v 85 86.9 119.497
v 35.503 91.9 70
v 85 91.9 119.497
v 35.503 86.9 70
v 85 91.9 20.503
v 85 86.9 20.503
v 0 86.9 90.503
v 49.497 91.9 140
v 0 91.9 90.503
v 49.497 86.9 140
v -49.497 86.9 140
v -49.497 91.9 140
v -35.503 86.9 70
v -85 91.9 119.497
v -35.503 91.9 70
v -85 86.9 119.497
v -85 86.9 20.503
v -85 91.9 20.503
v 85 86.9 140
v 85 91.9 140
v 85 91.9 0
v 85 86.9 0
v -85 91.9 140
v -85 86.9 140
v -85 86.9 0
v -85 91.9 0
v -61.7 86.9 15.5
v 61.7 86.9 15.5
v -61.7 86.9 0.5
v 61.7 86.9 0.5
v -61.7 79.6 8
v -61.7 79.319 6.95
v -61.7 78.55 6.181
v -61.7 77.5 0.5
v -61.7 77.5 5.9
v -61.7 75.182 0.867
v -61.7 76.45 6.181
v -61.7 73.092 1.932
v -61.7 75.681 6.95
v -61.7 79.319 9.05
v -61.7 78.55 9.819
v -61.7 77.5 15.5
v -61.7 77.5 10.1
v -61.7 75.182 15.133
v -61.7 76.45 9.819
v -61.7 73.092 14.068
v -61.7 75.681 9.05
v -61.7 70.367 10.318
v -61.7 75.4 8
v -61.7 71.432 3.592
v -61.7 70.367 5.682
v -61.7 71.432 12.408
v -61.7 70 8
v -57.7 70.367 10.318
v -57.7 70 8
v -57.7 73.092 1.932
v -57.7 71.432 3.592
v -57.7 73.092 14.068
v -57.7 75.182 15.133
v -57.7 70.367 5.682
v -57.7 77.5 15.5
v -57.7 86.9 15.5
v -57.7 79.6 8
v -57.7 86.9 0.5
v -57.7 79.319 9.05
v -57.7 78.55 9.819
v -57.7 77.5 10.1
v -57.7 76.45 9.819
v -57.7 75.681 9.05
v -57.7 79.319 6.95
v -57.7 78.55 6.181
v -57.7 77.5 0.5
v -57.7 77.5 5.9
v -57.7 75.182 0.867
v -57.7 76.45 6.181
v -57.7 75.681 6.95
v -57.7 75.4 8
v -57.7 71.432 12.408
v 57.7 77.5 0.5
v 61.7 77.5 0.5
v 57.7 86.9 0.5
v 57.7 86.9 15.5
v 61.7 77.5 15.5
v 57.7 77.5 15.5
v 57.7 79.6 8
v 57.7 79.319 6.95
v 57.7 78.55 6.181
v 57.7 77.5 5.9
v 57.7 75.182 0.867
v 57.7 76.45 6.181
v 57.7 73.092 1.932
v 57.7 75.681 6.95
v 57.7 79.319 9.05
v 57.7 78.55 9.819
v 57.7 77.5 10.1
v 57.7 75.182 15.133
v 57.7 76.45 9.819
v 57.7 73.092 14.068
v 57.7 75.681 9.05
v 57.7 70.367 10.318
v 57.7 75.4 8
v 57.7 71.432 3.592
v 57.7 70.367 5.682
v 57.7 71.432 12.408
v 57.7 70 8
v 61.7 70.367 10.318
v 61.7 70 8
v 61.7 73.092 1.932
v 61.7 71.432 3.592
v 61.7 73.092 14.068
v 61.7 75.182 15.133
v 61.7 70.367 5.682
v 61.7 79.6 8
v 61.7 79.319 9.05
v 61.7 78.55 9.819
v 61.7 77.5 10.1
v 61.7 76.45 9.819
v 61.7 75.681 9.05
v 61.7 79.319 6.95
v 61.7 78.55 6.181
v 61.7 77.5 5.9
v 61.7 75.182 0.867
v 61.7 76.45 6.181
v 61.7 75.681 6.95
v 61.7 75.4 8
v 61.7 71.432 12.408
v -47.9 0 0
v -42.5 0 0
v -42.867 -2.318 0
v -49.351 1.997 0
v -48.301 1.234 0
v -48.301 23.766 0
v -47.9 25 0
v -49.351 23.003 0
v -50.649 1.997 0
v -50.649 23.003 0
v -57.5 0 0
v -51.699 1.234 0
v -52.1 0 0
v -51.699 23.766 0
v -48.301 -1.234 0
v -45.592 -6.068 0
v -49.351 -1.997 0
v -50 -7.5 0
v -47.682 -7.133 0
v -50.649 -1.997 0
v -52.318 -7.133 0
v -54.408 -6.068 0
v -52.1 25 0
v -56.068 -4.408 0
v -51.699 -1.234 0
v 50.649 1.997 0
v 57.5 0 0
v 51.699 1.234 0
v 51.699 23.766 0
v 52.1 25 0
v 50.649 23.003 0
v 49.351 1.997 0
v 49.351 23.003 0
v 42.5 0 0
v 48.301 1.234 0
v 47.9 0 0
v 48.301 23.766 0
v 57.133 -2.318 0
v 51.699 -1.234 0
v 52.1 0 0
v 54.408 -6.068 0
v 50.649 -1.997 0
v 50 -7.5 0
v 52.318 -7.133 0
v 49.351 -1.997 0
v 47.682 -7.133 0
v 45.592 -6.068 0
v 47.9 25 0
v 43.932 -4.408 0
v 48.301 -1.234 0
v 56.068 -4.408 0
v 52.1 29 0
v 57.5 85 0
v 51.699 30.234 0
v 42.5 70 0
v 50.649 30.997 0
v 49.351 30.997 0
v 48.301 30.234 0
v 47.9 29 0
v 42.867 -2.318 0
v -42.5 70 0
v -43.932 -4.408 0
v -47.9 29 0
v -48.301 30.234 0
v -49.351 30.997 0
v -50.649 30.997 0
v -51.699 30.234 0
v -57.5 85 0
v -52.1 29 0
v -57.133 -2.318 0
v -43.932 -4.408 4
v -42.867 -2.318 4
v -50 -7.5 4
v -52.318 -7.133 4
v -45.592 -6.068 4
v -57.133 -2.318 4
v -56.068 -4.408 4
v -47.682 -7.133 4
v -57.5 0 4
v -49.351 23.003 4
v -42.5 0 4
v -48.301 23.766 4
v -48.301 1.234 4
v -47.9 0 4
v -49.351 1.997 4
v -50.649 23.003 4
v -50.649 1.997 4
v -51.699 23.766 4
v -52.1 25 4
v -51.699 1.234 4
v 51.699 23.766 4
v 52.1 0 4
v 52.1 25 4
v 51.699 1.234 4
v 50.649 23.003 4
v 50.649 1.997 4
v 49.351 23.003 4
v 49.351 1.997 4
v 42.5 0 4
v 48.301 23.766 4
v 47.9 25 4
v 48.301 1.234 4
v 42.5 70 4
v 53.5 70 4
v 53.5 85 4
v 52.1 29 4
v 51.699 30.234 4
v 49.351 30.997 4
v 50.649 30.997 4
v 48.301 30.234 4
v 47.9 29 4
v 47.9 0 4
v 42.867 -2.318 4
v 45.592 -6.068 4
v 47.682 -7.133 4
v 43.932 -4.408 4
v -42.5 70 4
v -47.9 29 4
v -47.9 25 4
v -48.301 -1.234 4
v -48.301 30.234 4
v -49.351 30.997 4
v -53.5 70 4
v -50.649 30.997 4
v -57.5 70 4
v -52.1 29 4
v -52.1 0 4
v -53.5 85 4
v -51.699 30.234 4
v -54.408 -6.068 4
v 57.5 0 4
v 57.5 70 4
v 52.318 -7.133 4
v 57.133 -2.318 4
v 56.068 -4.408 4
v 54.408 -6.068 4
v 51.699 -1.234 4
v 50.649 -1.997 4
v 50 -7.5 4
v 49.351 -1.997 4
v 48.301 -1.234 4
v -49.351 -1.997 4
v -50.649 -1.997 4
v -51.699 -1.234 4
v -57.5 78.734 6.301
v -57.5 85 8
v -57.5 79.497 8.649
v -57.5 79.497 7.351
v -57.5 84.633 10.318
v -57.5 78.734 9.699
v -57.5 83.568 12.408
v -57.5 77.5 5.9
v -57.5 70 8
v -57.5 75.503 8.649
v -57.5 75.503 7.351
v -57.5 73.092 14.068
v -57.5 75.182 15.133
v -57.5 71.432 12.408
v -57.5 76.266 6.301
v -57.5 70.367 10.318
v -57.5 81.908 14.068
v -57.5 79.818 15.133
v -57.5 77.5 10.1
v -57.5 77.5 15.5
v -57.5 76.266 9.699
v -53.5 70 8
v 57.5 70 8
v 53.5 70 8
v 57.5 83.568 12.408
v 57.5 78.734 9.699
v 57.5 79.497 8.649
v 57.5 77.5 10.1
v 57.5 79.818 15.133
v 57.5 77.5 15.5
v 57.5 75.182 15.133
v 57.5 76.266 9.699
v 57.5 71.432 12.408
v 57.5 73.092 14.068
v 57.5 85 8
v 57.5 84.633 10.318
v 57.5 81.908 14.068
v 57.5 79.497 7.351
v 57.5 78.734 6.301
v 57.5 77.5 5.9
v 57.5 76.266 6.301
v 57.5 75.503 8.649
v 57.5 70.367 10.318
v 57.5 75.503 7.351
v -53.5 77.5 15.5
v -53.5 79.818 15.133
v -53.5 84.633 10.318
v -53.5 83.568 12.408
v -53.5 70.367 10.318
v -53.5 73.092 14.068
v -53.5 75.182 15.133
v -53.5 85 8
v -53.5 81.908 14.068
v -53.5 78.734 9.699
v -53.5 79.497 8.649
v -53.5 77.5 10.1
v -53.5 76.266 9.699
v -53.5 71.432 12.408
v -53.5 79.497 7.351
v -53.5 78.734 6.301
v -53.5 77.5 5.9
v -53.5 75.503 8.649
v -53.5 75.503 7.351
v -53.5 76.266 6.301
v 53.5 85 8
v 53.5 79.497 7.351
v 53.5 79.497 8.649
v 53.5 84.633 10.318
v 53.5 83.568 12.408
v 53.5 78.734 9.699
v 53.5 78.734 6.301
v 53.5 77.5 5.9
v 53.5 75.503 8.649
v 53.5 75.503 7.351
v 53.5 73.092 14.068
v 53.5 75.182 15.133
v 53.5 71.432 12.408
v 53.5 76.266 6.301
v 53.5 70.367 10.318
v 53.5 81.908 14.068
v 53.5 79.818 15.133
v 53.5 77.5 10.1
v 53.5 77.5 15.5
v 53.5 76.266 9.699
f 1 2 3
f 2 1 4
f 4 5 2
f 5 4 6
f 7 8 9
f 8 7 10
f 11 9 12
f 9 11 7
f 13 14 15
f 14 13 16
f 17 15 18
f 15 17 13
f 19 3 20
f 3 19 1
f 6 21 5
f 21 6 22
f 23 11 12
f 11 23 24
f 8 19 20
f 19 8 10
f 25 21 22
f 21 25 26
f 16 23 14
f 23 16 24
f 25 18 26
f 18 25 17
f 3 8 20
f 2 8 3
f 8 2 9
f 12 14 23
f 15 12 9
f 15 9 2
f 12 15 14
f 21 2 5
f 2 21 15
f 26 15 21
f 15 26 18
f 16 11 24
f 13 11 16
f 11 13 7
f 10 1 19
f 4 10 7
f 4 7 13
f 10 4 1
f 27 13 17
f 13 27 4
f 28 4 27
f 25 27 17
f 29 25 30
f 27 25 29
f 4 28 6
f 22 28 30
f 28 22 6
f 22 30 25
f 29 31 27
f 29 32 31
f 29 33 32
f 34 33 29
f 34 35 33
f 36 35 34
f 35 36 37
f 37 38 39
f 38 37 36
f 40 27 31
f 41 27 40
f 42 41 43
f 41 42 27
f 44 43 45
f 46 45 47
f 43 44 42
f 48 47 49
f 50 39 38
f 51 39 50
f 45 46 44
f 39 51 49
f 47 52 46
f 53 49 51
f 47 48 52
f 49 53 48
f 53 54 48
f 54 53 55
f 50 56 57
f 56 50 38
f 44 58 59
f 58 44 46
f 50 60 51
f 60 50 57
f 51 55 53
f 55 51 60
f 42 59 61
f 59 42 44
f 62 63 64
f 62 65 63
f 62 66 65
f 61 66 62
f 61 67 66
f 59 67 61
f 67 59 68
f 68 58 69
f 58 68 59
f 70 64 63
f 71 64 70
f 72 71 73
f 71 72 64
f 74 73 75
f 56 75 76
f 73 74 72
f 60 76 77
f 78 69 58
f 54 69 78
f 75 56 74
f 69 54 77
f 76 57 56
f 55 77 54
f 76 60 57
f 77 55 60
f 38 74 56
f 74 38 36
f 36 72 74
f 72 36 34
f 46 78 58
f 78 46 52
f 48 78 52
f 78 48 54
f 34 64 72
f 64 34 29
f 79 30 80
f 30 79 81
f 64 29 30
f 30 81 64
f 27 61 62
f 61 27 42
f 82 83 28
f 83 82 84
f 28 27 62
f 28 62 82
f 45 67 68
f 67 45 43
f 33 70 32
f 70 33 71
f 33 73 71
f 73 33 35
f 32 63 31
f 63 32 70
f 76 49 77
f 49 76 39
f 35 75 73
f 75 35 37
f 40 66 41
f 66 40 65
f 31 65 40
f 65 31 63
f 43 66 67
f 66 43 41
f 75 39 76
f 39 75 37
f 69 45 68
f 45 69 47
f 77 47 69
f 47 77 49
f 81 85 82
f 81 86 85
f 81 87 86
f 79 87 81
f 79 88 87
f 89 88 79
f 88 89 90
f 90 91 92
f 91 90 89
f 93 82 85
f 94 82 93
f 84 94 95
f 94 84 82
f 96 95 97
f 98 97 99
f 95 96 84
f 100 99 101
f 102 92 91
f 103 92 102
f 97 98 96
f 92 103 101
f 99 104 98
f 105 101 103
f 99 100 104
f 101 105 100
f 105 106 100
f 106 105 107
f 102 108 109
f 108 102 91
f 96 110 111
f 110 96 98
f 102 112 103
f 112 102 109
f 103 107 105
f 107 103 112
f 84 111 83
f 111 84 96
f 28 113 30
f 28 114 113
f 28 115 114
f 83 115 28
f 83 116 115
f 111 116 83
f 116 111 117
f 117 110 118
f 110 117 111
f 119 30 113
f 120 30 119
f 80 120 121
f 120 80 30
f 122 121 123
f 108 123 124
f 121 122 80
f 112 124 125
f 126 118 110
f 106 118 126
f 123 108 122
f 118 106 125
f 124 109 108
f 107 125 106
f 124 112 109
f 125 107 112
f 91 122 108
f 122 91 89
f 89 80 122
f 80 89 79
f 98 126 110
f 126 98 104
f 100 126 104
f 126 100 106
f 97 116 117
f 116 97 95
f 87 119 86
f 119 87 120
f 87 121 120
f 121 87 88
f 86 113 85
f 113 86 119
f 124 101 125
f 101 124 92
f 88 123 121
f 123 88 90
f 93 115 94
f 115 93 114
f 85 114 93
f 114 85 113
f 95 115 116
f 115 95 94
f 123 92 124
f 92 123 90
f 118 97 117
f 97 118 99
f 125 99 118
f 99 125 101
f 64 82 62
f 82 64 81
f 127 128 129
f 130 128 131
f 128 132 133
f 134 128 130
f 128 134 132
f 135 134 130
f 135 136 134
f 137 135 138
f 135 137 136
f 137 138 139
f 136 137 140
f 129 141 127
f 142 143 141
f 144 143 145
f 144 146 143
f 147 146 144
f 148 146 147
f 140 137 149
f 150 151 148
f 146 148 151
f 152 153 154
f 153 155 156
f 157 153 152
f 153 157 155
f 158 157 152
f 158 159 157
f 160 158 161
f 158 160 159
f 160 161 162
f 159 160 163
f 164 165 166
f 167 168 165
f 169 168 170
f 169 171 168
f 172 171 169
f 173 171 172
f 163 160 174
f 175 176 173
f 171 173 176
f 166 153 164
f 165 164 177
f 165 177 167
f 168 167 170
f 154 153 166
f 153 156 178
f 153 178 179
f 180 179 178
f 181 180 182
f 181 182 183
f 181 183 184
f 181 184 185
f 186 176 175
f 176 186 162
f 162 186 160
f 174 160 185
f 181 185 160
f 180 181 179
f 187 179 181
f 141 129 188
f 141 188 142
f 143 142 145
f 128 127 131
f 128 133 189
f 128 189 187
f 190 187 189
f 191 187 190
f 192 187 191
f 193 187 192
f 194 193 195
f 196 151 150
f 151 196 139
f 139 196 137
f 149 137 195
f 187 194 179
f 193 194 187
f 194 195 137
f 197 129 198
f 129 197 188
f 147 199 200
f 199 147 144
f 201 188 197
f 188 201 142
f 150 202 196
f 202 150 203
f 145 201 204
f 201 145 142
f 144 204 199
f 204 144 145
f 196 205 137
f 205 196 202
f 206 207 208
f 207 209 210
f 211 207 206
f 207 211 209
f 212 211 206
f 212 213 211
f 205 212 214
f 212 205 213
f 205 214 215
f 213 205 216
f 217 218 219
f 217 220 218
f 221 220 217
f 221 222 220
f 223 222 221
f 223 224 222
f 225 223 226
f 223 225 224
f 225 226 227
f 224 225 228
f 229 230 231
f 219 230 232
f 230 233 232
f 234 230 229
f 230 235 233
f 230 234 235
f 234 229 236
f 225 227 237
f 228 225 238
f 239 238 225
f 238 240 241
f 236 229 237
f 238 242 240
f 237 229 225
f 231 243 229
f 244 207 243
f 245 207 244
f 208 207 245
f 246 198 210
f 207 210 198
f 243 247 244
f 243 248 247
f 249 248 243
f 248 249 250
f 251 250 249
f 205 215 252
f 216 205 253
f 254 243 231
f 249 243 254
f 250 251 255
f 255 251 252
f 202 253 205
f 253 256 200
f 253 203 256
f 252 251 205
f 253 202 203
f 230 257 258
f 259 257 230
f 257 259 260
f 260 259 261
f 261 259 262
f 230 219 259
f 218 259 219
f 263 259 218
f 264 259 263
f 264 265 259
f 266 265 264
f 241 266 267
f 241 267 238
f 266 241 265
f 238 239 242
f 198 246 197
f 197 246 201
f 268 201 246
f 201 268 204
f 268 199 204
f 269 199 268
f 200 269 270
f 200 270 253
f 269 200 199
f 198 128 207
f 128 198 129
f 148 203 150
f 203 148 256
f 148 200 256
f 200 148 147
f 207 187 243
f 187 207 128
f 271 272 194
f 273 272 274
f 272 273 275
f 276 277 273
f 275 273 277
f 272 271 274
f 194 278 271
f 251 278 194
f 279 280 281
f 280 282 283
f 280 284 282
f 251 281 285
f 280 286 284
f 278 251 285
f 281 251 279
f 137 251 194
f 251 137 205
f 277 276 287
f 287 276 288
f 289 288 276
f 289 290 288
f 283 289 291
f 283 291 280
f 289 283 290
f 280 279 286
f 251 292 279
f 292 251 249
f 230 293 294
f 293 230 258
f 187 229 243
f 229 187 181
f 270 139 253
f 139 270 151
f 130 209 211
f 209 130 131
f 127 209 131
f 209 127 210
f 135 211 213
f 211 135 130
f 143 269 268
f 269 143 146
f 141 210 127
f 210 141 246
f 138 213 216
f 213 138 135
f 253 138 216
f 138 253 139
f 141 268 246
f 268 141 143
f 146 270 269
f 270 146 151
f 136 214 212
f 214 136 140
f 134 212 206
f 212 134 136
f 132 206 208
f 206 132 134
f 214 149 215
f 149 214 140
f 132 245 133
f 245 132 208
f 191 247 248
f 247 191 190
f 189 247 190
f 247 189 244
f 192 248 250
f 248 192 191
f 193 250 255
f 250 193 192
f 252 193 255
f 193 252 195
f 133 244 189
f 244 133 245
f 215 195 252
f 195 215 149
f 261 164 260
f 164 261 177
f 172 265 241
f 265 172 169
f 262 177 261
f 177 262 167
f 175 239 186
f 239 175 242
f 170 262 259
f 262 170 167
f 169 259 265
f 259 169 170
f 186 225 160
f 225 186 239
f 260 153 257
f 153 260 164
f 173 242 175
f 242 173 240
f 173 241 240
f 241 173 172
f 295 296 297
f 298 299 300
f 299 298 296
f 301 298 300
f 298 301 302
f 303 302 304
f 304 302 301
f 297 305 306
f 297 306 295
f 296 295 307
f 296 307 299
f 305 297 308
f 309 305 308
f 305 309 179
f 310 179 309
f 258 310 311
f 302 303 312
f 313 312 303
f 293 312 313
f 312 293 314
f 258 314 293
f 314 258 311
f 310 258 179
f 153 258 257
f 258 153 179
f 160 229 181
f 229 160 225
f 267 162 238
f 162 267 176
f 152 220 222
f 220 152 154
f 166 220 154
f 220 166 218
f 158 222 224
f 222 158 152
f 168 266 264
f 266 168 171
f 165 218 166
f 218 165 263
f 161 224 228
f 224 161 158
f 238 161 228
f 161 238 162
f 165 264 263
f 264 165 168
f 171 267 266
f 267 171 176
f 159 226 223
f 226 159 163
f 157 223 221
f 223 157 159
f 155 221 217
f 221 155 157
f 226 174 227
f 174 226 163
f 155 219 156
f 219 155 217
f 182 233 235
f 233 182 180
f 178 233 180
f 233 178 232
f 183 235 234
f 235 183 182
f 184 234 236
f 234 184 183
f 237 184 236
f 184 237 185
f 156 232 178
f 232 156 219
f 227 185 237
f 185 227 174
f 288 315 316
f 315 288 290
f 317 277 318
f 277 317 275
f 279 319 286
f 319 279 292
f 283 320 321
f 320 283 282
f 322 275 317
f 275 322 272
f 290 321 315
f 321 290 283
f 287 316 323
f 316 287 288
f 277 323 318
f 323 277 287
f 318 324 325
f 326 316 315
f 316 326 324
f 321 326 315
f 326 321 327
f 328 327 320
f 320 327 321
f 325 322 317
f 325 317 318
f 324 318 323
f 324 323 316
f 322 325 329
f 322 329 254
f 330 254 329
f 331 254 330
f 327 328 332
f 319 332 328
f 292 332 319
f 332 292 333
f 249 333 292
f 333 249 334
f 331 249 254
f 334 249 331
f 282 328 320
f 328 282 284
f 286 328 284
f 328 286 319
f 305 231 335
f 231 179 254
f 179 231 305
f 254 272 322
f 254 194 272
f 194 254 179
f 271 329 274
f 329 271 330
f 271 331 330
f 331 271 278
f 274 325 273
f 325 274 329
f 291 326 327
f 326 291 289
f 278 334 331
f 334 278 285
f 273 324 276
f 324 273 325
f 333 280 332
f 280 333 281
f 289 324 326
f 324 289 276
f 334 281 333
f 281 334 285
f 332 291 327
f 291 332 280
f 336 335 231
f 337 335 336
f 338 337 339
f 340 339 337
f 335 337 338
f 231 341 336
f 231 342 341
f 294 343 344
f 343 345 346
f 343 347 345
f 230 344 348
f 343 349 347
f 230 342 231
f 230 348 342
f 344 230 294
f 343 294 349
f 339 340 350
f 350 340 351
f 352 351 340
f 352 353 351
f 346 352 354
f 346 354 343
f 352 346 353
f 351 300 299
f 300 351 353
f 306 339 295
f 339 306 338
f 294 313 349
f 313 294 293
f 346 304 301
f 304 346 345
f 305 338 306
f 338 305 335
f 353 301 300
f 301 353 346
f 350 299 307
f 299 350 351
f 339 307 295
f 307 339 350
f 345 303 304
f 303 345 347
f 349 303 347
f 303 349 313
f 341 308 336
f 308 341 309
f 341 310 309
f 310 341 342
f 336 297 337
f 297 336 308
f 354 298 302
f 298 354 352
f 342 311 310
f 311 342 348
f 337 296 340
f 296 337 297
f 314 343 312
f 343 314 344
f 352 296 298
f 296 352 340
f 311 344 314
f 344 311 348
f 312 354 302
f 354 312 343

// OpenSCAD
//Customizable VESA mount
//by eriqjo February 21, 2015

//TODO  redundant top plate support (rectangle between the semi-circles)

//CUSTOMIZER VARIABLES

/* [Global] */

//Which parts do you want to make?
Make_Part = 3; // [1:Back Bracket, 2:Top Plate, 3:Both]

/* [Back Bracket] */

//Choose the VESA mount size, mm
VESA_Size = 100; // [75:75x75, 100:100x100, 200:200x200]

//What are you mounting to?
Mount_To = 2; // [1:Direct to monitor/TV, 2:Wall mounting bracket]

//Mounting bolt diameter, mm:
Bolt_Dia = 4; // [3:8]

//Bracket width, mm:
Bracket_Width = 15; // [9:30]

//Bracket thickness, mm:
Bracket_Thickness = 4; // [4:20]

//Distance from top bracket hole to top of monitor/TV
Height_To_Top = 45;

/* [Top Plate] */

//Top plate style
Top_Style = 2; // [1:Solid(square), 2:Lite(x)]

//Top plate thickness, mm: 
Plate_Thickness = 5; // [3:8]

//The width of the box you are mounting, mm
Plate_Width = 170;

//The depth of the box you are mounting, mm
Plate_Depth = 140;

//How far back should the top plate be shifted, mm
Shift_Top_Back = 0;

//CUSTOMIZER VARIABLES END

slop = 0.2 * 1;

module buildBack(ydim = 25){

	topLength = Height_To_Top + ydim;

	difference(){
		union(){
			for(i = [-1, 1]){			//creating the two legs of the bracket
				translate([ i * VESA_Size/2, 0, 0])
					difference(){
						union(){
							cylinder(h = Bracket_Thickness, r = Bracket_Width/2, $fn = 20);		//bottom of leg
							translate([-Bracket_Width/2, 0, 0])									//leg
								cube([Bracket_Width, topLength, Bracket_Thickness]);			
						} // union
						translate([0, 0, -0.1])
							cylinder(h = Bracket_Thickness + slop, r = (Bolt_Dia + slop)/2, $fn = 10);	// bottom hole
						translate([0, ydim, -0.1])
							cylinder(h = Bracket_Thickness + slop, r = (Bolt_Dia + slop)/2, $fn = 10);  //bottom of slot
						translate([0, ydim + Bolt_Dia, -0.1])
							cylinder(h = Bracket_Thickness + slop, r = (Bolt_Dia + slop)/2 , $fn = 10); //top of slot
						translate([-(Bolt_Dia + slop)/2, ydim, -0.1])
							cube([Bolt_Dia + slop, Bolt_Dia, Bracket_Thickness + 0.2]);					//between the slot
					} // difference
			} // for
			translate([-Bracket_Width/2 - VESA_Size/2, topLength, 0])					//top portion of the bracket
				cube([VESA_Size + Bracket_Width, Bracket_Width, Bracket_Thickness]);
			for(i = [-1, 1]){
				translate([ i * (Bracket_Width/2 - Bracket_Thickness/2 + VESA_Size/2 ), topLength + Bracket_Width/2, Bracket_Thickness + (Bolt_Dia/2) + 2]){ // start of the semi-circle mounts
					rotate([0, 90, 0]){
						difference(){
							union(){
								cylinder( h = Bracket_Thickness, r = Bracket_Width/2, center = true, $fn = 20);
								translate([Bracket_Width/4, 0, 0,])
									cube([Bracket_Width/2, Bracket_Width, Bracket_Thickness], center = true);
							} // union
							cylinder(h = Bracket_Thickness + slop, r = (Bolt_Dia + slop)/2, center = true, $fn = 10);
						}//difference
					}//rotate	
				}//translate
			}//for	
		} // union
		translate([0, 0, -20]) {
			cube([300, 300, 40], center = true);
		}//translate
	}//difference
}//module buildBack

module buildTop(ydim = 25){	

	topLength = Height_To_Top + ydim;
	unit = min(Plate_Depth, Plate_Width)/2;
	
	union(){
		if(Top_Style == 1){		//solid square top plate
			translate([0, Plate_Thickness/2  + topLength + 1.9 + Bracket_Width, Plate_Depth/2 - Shift_Top_Back])  //original

				cube([Plate_Width, Plate_Thickness, Plate_Depth], center = true);
		}//if
		
		if(Top_Style == 2){		//Lite X-style top plate
			translate([0, Plate_Thickness/2  + topLength + 1.9 + Bracket_Width, Plate_Depth/2 - Shift_Top_Back])
				difference(){
					cube([Plate_Width, Plate_Thickness, Plate_Depth], center = true);								//plate itself
					for(i = [[Plate_Width/2, 0, 0], [0, 0, Plate_Depth/2], [-Plate_Width/2, 0, 0]]){
						translate(i)	
							rotate([0, 45, 0]){
								cube([unit, Plate_Thickness+1, unit], center = true);
							}//rotate
					}//for
				}//difference	
		}//if
		for(i = [-1,1]){
			translate([i * (Bracket_Thickness/2 + VESA_Size/2 + Bracket_Width/2 + slop), topLength + Bracket_Width/2, Bracket_Thickness + (Bolt_Dia/2) + 2]){
				rotate([0, 90, 0]){
					difference(){
						union(){
							cylinder( h = Bracket_Thickness, r = Bracket_Width/2, center = true, $fn = 20);			//swivel attachment semi-circle
							translate([0,Bracket_Width/4 + 1,0])
								cube([Bracket_Width, Bracket_Width/2 + 2, Bracket_Thickness], center = true);		//swivel attachment point
						}//union
						cylinder( h = Bracket_Thickness + slop, r = (Bolt_Dia + slop)/2, center = true, $fn = 12);  //swivel hole
					}//difference
				}//rotate	
			}//translate
		}//for
		translate([0, Plate_Thickness/2  + topLength + 1.9 + Bracket_Width, Bracket_Thickness + (Bolt_Dia/2) + 2])
			cube([2*Bracket_Thickness + VESA_Size + Bracket_Width +slop, Plate_Thickness, Bracket_Width], center = true);
	}//union		
}//module buildTop

if (Mount_To == 1){
	if(Make_Part == 1) {buildBack(ydim = VESA_Size);}
	if(Make_Part == 2) {buildTop(ydim = VESA_Size);}
	if(Make_Part == 3) {buildTop(ydim = VESA_Size); buildBack(ydim = VESA_Size);}
}// if

if (Mount_To == 2){
	if(Make_Part == 1) {buildBack(ydim = 25);}
	if(Make_Part == 2) {buildTop(ydim = 25);}
	if(Make_Part == 3) {buildTop(ydim = 25); buildBack(ydim = 25);}
}// if
